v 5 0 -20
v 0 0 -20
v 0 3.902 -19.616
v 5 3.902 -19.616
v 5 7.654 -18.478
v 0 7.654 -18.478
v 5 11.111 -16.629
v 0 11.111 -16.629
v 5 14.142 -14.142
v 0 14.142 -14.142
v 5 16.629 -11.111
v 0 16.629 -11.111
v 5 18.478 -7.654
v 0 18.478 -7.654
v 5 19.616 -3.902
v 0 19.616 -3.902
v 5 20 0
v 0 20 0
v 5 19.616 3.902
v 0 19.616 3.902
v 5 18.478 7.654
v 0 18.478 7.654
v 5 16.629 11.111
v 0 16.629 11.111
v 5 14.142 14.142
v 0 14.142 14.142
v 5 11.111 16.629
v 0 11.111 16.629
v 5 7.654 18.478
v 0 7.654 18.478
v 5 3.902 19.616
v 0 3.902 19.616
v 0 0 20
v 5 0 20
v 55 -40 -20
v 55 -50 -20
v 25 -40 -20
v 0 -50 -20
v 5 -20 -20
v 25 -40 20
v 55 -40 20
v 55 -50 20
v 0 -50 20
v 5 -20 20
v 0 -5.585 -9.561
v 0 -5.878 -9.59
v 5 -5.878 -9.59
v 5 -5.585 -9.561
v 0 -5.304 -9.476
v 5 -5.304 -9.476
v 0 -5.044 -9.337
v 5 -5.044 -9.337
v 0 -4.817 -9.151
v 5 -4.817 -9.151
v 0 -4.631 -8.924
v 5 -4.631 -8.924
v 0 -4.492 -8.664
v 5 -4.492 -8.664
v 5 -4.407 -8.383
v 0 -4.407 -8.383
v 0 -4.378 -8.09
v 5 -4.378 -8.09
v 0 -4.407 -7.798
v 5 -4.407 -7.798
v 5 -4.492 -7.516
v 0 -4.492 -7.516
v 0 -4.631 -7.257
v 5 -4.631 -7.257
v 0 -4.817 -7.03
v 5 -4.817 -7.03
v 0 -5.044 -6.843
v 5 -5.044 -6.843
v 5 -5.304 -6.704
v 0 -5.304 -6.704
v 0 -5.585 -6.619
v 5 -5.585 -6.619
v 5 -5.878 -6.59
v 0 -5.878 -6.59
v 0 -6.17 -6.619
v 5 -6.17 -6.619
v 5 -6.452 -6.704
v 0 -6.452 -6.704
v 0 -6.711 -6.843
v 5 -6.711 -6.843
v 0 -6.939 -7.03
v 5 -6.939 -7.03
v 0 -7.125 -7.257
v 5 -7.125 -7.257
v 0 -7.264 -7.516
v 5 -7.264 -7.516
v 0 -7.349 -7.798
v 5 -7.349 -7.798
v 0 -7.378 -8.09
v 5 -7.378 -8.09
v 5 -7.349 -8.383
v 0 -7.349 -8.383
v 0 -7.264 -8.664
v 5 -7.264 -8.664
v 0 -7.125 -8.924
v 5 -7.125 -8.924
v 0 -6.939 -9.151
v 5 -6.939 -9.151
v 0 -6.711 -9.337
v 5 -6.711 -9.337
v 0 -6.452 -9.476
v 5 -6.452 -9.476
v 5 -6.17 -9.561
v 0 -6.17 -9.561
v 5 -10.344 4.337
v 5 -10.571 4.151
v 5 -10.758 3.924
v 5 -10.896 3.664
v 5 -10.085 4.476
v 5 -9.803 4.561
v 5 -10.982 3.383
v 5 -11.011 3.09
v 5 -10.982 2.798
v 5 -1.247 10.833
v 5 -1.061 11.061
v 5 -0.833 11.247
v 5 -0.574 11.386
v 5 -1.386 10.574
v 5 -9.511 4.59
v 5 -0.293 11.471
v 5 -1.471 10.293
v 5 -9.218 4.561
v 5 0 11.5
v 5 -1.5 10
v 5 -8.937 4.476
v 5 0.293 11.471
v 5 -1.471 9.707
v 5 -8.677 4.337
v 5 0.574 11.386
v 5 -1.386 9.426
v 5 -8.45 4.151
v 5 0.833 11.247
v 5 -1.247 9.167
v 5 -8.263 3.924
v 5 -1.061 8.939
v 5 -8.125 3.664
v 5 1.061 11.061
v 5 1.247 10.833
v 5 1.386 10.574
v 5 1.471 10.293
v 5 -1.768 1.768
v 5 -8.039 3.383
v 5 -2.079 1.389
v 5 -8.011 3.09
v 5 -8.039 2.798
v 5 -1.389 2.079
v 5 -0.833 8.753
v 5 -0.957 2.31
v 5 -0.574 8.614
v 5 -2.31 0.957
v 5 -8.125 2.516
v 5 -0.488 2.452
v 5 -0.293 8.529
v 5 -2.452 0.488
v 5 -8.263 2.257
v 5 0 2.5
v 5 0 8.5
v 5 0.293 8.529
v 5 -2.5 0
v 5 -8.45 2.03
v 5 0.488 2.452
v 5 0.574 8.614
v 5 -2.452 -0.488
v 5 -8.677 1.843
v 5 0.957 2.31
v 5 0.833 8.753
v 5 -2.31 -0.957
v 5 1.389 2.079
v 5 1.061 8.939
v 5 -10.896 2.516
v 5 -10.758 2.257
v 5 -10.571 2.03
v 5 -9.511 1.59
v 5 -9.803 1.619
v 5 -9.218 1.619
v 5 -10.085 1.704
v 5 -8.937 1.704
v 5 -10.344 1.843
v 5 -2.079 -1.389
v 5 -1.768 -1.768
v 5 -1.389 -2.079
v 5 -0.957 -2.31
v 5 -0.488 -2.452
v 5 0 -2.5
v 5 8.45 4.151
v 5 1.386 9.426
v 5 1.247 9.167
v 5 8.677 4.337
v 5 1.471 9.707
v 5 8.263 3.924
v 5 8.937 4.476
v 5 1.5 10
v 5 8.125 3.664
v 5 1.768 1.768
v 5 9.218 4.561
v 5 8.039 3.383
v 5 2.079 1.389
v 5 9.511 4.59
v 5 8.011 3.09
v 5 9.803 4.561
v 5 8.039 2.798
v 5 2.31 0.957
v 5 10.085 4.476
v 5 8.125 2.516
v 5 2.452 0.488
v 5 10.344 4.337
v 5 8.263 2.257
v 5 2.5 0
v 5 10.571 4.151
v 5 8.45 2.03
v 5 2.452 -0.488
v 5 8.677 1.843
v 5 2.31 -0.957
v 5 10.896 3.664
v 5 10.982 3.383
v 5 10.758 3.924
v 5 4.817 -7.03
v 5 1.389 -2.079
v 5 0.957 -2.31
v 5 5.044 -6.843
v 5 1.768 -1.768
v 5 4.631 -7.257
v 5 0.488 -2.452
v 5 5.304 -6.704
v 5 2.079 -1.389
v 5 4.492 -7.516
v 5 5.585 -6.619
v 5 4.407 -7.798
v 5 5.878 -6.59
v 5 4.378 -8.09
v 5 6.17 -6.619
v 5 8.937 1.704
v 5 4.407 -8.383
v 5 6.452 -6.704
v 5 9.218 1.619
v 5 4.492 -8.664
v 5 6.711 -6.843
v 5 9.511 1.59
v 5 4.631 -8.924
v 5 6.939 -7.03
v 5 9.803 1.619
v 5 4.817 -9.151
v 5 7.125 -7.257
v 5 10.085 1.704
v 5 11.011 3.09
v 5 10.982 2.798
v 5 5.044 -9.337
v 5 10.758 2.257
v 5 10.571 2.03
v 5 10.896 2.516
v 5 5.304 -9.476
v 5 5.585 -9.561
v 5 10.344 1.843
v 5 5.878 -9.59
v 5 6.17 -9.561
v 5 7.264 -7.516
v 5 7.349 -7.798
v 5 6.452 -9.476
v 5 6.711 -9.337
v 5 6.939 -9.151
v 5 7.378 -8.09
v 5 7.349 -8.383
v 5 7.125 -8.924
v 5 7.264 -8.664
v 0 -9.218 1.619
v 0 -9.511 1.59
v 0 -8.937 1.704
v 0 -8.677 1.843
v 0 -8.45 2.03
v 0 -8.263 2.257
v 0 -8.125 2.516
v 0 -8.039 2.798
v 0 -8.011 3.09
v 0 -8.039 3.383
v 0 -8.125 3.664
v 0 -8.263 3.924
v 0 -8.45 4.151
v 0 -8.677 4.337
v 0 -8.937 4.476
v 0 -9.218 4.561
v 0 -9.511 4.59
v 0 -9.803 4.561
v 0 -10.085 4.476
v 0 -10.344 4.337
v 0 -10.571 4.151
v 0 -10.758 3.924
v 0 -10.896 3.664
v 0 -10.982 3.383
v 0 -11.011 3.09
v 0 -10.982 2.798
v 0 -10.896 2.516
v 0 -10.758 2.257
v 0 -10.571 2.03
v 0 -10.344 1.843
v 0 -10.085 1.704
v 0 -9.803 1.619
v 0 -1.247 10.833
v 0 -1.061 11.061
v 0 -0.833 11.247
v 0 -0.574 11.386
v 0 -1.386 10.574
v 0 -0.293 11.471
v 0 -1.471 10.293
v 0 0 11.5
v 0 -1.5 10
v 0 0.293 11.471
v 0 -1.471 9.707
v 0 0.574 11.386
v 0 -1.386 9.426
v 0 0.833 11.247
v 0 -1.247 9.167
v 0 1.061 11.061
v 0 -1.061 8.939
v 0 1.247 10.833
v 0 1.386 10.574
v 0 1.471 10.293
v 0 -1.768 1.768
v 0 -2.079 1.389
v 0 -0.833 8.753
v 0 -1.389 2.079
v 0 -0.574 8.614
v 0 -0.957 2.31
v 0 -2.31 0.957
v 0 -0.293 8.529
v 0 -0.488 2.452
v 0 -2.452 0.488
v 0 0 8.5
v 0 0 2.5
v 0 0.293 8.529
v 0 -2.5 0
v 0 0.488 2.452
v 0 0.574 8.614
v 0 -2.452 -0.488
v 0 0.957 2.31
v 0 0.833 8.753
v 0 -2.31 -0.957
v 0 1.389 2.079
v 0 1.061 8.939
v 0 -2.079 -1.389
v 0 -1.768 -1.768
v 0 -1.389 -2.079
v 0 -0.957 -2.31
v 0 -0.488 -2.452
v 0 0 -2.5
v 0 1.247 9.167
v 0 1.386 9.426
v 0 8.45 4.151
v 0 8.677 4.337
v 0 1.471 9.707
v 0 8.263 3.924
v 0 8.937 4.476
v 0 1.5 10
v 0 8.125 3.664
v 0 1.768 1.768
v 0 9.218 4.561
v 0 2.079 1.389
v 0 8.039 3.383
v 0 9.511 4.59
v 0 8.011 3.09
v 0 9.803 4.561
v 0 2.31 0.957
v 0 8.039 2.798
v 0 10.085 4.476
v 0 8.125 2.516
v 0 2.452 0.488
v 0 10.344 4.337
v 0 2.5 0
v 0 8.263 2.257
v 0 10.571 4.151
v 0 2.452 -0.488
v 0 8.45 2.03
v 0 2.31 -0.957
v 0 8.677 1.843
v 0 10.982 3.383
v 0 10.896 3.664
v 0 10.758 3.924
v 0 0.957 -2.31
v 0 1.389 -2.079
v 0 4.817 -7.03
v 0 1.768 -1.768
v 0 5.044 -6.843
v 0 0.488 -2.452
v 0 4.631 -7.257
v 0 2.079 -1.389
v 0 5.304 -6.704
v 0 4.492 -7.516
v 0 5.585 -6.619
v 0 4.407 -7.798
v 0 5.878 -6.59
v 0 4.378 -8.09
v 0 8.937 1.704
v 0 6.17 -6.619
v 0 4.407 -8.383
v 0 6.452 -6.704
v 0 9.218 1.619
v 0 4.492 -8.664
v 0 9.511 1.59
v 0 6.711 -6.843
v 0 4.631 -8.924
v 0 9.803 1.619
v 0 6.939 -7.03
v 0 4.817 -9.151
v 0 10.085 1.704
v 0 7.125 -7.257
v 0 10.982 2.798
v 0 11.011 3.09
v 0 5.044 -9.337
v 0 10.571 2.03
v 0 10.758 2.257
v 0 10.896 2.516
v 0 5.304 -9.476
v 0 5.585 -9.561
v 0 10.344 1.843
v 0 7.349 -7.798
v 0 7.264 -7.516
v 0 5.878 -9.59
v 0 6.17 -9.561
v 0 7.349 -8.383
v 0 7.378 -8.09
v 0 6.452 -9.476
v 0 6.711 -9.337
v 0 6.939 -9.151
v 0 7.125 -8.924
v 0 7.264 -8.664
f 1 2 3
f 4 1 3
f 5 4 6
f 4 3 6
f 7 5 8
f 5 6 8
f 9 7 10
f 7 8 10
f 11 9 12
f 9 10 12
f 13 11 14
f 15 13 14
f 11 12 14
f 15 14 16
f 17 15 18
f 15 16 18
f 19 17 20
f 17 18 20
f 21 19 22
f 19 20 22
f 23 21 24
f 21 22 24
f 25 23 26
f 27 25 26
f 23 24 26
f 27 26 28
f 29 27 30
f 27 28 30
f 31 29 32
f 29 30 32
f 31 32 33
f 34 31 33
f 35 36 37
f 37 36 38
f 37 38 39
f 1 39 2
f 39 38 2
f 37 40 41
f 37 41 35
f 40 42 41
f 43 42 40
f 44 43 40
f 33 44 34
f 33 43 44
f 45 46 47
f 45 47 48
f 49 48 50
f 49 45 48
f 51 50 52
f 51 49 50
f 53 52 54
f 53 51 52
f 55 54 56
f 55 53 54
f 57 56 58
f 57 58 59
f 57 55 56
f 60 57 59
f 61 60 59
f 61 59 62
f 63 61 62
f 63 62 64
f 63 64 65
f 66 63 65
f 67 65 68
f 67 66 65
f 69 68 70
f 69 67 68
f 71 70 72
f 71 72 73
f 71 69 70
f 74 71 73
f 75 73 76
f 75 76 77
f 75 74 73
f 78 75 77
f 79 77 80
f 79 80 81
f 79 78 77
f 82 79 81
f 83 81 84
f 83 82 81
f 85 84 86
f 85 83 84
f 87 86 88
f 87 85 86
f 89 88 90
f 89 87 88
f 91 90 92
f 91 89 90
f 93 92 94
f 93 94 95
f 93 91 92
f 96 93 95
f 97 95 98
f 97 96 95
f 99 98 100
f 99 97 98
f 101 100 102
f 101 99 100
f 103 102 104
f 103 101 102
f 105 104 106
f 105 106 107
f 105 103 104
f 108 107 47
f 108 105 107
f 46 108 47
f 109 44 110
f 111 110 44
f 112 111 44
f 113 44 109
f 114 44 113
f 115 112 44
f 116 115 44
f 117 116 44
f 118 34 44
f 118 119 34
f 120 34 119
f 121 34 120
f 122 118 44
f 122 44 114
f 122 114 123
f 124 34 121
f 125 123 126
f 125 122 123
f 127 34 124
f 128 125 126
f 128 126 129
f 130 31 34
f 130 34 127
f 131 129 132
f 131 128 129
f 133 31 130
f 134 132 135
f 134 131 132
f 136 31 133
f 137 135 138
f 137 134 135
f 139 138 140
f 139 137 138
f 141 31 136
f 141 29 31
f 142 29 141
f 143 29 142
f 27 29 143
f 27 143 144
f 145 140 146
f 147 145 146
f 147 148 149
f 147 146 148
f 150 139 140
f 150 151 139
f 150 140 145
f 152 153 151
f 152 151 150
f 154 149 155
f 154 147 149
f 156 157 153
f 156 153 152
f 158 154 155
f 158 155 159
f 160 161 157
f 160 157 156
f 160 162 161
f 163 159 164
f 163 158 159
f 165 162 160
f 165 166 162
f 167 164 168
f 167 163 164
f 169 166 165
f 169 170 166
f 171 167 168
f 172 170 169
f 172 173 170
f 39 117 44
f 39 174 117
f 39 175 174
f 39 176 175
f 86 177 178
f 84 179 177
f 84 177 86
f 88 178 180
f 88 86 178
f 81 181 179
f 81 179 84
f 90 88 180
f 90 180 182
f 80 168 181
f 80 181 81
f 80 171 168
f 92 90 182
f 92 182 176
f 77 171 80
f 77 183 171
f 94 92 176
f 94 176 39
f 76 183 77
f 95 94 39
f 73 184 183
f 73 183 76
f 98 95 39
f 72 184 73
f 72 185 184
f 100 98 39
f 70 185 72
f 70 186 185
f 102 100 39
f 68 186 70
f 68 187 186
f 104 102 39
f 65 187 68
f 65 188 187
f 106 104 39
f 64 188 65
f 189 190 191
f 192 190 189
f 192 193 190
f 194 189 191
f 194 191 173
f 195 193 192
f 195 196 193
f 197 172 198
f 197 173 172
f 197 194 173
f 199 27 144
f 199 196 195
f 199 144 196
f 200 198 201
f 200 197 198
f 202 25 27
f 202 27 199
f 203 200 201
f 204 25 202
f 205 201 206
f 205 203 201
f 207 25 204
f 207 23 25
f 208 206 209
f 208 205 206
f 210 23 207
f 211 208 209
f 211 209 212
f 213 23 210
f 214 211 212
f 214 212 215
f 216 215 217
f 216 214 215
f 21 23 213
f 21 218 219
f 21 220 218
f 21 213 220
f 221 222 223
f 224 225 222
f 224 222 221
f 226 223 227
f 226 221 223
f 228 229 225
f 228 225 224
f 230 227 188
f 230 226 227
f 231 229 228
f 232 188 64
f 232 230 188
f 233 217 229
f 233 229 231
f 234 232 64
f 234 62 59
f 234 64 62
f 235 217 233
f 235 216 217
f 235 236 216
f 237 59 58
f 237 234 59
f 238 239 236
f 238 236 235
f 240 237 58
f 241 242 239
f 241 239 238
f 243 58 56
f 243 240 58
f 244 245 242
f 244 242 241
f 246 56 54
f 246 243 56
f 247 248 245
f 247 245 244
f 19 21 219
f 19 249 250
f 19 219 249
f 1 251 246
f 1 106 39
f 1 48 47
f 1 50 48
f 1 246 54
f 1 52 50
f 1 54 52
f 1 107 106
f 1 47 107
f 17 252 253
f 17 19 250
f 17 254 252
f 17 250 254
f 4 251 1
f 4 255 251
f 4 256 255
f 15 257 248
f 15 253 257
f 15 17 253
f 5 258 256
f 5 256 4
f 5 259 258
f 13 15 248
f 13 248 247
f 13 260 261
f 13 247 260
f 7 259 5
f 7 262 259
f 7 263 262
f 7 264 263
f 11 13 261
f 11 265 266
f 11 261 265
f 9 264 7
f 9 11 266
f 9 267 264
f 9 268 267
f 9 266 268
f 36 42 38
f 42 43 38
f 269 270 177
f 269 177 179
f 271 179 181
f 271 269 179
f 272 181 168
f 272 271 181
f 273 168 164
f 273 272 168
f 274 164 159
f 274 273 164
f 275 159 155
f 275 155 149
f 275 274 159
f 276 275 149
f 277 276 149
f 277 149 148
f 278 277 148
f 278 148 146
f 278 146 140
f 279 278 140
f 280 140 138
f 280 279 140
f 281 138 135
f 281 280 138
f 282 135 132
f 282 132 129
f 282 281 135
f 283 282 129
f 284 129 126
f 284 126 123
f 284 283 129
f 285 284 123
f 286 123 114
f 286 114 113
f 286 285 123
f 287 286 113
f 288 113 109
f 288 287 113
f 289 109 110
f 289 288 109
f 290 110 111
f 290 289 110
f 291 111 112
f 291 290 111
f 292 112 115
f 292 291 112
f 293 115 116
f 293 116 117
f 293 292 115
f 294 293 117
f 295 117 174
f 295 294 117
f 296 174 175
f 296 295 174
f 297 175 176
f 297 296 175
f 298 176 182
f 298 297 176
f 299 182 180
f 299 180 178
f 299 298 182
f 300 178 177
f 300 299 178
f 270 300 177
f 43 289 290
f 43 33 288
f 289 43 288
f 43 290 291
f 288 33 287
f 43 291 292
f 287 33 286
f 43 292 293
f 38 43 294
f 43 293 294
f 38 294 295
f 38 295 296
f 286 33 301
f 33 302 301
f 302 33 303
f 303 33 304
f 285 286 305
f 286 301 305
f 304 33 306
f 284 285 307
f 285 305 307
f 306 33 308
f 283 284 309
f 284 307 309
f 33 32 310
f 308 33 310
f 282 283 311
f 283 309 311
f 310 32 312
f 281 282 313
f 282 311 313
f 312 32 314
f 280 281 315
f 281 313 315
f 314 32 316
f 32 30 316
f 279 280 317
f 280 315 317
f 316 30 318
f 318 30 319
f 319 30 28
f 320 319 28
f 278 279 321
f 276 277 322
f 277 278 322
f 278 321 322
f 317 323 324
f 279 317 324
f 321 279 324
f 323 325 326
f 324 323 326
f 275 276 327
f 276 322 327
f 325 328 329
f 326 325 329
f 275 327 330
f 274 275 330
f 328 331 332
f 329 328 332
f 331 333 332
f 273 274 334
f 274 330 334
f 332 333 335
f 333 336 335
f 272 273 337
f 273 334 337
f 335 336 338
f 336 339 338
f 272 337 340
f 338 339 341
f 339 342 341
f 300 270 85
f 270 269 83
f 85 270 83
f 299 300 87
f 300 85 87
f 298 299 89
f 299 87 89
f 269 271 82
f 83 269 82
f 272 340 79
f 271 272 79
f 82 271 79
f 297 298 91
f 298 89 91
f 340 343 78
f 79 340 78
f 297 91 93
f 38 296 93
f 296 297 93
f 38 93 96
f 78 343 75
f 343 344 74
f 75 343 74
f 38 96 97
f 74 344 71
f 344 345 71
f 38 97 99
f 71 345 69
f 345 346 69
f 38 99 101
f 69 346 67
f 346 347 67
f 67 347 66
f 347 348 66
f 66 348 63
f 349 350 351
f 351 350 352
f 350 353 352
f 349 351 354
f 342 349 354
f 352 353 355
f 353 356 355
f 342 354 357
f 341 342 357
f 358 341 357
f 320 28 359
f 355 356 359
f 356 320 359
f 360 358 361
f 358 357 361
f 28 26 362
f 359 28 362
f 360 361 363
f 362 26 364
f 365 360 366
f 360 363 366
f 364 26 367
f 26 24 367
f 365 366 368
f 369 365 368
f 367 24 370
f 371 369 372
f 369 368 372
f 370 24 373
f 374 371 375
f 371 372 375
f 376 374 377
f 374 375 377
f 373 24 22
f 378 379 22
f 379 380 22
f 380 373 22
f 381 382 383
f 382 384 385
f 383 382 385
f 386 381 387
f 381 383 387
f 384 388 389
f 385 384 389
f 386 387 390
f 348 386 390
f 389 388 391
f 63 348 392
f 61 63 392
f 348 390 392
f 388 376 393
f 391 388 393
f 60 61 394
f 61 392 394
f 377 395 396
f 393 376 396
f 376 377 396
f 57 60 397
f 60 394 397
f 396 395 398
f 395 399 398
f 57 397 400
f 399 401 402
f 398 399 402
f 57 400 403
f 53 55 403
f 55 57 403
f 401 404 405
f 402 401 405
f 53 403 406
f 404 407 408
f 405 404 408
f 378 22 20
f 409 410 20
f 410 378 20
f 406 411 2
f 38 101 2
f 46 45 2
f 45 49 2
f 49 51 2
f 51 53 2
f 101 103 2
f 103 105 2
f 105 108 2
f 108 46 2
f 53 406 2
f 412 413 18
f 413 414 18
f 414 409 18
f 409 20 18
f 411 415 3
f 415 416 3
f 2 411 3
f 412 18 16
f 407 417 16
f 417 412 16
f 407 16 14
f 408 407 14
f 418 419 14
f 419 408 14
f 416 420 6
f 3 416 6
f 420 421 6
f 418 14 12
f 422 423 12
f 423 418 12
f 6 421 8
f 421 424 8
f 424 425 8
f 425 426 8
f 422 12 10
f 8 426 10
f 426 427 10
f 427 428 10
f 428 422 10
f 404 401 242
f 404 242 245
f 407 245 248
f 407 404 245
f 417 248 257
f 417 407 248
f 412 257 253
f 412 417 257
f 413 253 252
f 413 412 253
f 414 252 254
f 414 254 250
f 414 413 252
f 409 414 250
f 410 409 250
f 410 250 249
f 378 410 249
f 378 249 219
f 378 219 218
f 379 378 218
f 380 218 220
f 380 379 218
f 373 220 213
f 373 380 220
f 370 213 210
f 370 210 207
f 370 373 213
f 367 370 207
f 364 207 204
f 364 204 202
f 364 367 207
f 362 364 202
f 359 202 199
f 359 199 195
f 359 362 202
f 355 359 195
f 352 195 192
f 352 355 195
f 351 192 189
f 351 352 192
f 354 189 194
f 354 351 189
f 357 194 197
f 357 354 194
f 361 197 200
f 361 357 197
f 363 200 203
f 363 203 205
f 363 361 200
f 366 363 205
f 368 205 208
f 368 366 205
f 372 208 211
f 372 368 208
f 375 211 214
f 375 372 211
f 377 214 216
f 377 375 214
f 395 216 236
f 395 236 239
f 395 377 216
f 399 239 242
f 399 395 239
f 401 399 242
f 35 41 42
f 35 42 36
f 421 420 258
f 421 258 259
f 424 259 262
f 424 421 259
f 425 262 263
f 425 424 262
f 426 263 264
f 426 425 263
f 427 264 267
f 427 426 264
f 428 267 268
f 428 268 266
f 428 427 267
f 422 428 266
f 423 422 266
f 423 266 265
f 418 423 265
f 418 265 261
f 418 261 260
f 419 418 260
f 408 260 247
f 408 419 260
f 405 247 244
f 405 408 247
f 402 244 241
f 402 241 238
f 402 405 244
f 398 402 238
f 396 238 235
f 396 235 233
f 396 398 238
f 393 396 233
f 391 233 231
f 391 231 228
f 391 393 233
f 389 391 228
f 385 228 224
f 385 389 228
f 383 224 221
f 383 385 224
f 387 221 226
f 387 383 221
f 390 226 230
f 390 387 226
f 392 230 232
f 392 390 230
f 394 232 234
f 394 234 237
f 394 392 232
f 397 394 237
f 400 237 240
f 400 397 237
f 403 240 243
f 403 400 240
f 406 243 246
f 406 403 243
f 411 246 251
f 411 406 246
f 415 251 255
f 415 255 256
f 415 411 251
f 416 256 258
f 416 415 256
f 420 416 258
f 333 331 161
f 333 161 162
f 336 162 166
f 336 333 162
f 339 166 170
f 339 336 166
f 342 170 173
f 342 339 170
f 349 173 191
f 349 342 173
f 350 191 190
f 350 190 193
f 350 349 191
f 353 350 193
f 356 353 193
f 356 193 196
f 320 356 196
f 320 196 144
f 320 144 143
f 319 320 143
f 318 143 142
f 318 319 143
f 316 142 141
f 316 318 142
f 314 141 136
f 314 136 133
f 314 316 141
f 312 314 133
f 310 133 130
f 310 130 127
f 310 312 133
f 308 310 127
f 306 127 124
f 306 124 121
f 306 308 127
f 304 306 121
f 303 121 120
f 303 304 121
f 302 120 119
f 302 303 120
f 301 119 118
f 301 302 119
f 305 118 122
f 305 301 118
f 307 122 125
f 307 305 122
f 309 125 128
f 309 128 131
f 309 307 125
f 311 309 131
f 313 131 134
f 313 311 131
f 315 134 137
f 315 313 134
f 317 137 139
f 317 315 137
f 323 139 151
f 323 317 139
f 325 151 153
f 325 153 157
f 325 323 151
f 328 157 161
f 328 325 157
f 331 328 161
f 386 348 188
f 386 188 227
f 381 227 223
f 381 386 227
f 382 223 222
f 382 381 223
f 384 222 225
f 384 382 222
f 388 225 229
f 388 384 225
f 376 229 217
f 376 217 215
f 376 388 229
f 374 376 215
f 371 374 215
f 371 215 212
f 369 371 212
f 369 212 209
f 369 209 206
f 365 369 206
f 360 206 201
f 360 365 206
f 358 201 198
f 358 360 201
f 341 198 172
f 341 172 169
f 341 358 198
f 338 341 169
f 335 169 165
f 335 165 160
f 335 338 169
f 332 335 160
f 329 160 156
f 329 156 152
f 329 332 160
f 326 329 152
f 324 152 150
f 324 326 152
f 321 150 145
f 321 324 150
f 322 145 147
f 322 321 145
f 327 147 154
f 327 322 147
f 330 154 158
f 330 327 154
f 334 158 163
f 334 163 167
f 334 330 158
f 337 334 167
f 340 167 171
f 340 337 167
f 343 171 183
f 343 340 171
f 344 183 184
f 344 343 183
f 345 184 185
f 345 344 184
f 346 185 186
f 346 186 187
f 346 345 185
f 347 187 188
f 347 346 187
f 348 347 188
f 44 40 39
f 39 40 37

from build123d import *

# Parameters (mm, degrees)
SKETCH1_R            = 1.5
SKETCH1_R_2          = 2.5
BOSS_EXTRUDE11_DEPTH = 5
SKETCH2_W            = 40
SKETCH2_H            = 10
BOSS_EXTRUDE12_DEPTH = 50
CHAMFER1_SIZE        = 20


with BuildPart() as part:
    # Sketch1 → Boss-Extrude11 (new body)
    with BuildSketch(Plane(origin=(0, 0, 0), x_dir=(0, 0, -1), z_dir=(1, 0, 0))):
        with BuildLine():
            Line((-20, 0), (-20, -50))
            Line((-20, -50), (20, -50))
            Line((20, -50), (20, 0))
            ThreePointArc((20, 0), (0, 20), (-20, 0))
        make_face()
        with Locations((-10, 0)):
            Circle(SKETCH1_R, mode=Mode.SUBTRACT)
        Circle(SKETCH1_R_2, mode=Mode.SUBTRACT)
        with Locations((8.090169944, -5.877852523)):
            Circle(SKETCH1_R, mode=Mode.SUBTRACT)
        with Locations((-3.090169944, -9.510565163)):
            Circle(SKETCH1_R, mode=Mode.SUBTRACT)
        with Locations((8.090169944, 5.877852523)):
            Circle(SKETCH1_R, mode=Mode.SUBTRACT)
        with Locations((-3.090169944, 9.510565163)):
            Circle(SKETCH1_R, mode=Mode.SUBTRACT)
    extrude(amount=BOSS_EXTRUDE11_DEPTH)

    # Sketch2 → Boss-Extrude12 (add)
    with BuildSketch(Plane(origin=(5, 0, 0), x_dir=(0, 0, -1), z_dir=(1, 0, 0))):
        with Locations((0, -45)):
            Rectangle(SKETCH2_W, SKETCH2_H)
    extrude(amount=BOSS_EXTRUDE12_DEPTH)

    # Chamfer1
    chamfer1_edges = [part.edges().sort_by_distance(p)[0] for p in [
        (5, -40, 0),
    ]]
    chamfer(chamfer1_edges, length=CHAMFER1_SIZE)


solid = part.part
